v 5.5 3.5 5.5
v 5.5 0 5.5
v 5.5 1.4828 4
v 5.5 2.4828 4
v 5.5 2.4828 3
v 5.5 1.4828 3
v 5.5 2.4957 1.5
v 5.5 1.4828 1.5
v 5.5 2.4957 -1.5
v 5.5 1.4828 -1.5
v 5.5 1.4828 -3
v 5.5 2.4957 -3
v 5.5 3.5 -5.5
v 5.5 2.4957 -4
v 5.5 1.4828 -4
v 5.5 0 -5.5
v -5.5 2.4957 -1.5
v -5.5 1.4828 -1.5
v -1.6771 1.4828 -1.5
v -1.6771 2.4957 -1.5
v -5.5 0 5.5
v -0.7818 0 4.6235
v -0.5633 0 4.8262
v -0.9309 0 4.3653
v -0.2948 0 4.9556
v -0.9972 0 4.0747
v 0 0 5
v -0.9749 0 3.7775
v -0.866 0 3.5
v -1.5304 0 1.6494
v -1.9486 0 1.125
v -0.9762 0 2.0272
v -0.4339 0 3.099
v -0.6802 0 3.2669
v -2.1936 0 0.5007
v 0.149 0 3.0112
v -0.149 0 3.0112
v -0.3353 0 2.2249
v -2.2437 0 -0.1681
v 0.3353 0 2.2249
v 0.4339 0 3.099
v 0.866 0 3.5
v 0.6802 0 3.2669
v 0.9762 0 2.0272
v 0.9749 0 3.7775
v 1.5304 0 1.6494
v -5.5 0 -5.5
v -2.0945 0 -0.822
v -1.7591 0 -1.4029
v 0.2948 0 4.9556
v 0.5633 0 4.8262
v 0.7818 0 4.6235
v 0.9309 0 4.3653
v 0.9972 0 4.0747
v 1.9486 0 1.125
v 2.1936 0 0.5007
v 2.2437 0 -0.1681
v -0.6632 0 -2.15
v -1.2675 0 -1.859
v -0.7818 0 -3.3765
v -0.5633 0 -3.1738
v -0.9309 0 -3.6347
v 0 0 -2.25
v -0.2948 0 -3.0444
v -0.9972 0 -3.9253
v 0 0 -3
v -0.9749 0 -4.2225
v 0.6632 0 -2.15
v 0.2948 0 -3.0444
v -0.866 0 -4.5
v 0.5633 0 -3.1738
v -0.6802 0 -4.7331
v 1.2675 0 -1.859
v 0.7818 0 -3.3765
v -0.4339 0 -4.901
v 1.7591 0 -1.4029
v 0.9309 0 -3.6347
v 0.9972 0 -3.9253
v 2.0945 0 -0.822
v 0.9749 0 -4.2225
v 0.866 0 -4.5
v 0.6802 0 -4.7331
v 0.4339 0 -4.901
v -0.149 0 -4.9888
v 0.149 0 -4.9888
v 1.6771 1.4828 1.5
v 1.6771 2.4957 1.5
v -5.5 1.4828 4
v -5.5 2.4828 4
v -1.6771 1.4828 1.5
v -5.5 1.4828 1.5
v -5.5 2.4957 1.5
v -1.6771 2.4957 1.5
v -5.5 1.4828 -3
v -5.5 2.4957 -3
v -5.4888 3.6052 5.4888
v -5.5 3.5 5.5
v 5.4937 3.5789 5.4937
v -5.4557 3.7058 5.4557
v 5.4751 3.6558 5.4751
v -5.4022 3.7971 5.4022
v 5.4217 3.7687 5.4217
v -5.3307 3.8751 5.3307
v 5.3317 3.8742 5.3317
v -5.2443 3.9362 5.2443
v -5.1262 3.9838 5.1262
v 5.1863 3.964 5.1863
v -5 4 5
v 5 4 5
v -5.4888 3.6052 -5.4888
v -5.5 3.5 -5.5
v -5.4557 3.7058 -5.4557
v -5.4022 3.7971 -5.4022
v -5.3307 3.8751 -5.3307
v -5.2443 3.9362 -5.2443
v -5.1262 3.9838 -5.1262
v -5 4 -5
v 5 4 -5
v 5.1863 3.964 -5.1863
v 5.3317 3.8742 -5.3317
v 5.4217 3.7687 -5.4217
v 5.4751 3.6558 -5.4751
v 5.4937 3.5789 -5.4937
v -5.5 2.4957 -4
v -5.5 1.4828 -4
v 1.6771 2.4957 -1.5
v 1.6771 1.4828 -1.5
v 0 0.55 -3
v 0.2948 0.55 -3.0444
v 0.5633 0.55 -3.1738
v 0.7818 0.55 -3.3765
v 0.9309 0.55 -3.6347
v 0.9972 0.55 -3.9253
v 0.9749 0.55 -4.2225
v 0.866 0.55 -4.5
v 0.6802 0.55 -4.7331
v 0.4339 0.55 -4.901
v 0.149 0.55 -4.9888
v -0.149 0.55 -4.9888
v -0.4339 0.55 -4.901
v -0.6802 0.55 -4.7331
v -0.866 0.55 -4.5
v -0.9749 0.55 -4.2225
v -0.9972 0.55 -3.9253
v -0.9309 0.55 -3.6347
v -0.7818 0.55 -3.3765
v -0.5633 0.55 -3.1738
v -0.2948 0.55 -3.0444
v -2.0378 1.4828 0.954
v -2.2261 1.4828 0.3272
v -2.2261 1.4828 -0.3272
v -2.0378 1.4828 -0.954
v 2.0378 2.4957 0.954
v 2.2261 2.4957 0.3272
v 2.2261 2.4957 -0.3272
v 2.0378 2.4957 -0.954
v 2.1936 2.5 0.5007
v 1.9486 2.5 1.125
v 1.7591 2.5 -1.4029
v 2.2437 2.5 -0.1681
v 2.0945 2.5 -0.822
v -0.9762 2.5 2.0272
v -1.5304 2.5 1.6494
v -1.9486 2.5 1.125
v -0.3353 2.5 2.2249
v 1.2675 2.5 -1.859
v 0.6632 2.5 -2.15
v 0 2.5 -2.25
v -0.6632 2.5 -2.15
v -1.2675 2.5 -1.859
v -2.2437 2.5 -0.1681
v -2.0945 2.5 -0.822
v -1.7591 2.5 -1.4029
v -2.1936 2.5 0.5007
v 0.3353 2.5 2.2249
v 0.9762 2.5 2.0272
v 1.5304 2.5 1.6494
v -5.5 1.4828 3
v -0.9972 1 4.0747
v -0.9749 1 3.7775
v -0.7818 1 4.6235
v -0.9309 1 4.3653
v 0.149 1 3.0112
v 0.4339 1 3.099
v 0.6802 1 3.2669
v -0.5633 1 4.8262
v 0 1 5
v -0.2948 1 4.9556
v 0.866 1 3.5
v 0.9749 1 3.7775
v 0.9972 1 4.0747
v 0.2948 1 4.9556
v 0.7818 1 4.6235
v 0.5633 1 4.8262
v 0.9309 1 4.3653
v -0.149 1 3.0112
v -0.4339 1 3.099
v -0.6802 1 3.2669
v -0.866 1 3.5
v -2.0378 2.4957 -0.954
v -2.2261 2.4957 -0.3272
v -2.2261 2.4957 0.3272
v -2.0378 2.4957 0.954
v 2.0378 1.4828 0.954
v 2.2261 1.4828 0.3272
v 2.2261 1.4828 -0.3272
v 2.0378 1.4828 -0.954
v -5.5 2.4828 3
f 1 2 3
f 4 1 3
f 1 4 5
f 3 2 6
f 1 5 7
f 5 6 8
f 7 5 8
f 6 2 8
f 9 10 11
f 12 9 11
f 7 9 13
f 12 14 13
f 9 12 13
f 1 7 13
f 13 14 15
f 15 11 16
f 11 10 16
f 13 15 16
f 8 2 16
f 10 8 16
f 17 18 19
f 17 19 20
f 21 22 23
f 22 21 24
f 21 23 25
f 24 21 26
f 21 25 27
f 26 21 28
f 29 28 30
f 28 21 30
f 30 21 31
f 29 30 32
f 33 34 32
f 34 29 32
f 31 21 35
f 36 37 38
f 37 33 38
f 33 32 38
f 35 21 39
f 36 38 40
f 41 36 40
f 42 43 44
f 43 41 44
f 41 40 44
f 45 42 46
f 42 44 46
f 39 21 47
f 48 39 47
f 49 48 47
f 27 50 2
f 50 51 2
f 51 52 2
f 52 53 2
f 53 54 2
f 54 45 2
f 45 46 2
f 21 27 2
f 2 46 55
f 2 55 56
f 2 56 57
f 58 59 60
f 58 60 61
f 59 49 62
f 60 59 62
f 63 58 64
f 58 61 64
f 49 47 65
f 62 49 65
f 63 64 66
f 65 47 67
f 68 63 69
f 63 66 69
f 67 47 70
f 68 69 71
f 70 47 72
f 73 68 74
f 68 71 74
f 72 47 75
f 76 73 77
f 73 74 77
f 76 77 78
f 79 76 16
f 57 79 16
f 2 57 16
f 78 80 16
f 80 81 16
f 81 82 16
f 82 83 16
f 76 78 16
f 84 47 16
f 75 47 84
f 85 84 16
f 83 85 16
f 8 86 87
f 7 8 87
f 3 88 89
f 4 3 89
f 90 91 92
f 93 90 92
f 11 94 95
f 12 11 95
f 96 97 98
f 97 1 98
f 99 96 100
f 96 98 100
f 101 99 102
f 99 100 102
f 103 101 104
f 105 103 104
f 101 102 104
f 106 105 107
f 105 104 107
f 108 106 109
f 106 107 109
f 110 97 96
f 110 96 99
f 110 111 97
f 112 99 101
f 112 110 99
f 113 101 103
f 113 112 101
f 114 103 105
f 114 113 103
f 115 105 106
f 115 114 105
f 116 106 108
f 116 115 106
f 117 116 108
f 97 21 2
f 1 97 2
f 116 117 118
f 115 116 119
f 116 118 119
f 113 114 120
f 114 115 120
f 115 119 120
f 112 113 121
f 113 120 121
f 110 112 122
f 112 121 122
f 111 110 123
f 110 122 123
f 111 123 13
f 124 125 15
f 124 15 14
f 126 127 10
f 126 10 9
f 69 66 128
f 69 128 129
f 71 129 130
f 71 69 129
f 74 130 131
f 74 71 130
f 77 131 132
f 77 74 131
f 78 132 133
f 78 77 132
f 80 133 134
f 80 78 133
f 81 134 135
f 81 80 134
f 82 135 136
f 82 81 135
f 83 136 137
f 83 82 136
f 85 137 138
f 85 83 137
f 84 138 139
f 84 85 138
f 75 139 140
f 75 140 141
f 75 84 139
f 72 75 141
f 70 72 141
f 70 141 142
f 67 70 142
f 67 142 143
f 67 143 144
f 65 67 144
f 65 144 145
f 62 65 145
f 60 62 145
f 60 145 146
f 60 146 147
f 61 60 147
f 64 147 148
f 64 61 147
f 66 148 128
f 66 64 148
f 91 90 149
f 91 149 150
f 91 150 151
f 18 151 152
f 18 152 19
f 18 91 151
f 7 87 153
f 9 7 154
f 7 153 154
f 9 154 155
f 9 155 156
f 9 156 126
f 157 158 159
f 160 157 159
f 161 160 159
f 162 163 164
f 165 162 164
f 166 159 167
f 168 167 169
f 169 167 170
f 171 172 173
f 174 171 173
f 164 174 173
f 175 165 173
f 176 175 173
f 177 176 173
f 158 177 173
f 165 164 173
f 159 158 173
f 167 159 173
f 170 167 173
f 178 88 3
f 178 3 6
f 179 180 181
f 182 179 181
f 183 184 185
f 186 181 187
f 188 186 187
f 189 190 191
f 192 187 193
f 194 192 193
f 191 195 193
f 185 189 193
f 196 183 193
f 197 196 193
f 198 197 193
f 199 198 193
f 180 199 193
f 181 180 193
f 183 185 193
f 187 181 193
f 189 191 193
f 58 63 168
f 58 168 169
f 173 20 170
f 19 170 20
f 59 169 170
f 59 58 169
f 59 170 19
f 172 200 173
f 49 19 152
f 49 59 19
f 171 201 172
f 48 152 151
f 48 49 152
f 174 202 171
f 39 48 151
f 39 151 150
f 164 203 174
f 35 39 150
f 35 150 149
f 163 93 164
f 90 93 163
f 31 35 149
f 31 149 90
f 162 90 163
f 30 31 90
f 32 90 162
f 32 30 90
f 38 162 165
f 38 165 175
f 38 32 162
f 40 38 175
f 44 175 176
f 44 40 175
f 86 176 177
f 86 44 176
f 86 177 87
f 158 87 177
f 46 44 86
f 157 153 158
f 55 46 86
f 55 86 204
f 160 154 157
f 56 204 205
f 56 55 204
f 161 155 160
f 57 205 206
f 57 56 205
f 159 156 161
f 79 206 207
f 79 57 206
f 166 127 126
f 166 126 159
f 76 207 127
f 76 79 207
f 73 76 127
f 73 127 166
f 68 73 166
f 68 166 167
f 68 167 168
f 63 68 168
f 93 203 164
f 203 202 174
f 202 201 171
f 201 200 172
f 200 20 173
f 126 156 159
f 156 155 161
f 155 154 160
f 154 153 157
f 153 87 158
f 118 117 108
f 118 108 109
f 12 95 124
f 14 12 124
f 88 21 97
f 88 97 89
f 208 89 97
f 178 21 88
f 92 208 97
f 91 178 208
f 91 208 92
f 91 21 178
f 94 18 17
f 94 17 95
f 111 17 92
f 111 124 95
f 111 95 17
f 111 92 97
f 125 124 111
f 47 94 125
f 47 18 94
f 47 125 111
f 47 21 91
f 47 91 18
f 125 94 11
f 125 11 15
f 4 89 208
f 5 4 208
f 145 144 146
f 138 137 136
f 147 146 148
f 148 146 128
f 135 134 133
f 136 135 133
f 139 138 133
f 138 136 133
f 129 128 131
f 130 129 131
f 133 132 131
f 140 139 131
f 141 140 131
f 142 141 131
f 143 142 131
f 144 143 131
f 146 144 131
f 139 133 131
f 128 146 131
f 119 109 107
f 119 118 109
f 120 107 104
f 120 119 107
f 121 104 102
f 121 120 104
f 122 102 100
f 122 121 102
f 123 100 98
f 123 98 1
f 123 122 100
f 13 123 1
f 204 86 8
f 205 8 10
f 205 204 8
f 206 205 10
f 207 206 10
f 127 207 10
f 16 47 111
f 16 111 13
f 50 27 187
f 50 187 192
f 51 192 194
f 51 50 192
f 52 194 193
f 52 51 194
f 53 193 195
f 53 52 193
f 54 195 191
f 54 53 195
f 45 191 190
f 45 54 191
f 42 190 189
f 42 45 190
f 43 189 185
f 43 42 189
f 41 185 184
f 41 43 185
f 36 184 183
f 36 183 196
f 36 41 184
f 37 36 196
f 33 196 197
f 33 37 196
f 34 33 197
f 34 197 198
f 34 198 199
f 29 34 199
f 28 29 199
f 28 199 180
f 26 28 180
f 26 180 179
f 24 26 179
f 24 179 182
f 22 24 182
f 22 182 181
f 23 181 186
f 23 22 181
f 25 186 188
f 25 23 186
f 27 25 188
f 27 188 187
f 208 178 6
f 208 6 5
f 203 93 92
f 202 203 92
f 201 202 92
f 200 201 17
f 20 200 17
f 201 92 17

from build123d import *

# Parameters (mm, degrees)
SKETCH2_W               = 11
SKETCH2_H               = 11
BOSS_EXTRUDE1_DEPTH     = 4
CUT_EXTRUDE2_DEPTH      = 9.746427842
CUT_EXTRUDE2_DEPTH_BACK = 9.746427842
SKETCH4_W               = 1
SKETCH4_H               = 1
SKETCH4_W_2             = 3
SKETCH4_H_2             = 1.012866832
CUT_EXTRUDE3_DEPTH      = 2.5
CUT_EXTRUDE3_DEPTH_BACK = 9.746427842
SKETCH5_R               = 2.25
SKETCH8_R               = 1
CUT_EXTRUDE4_DEPTH      = 1
SKETCH8_3_R             = 1
CUT_EXTRUDE5_DEPTH      = 0.55
FILLET2_R               = 0.5


with BuildPart() as part:
    # Sketch2 → Boss-Extrude1 (new body)
    with BuildSketch(Plane(origin=(0, 0, 0), x_dir=(1, 0, 0), z_dir=(0, 1, 0))):
        Rectangle(SKETCH2_W, SKETCH2_H)
    extrude(amount=BOSS_EXTRUDE1_DEPTH)

    # Sketch4 → Cut-Extrude2 (cut, two sides: drawn at the far end of the back side and taken through both)
    with BuildSketch(Plane(origin=(0, 0, 0), x_dir=(0, 0, -1), z_dir=(1, 0, 0)).offset(-CUT_EXTRUDE2_DEPTH_BACK)):
        with Locations((-3.5, 1.982791405)):
            Rectangle(SKETCH4_W, SKETCH4_H)
        with Locations((0, 1.989224821)):
            Rectangle(SKETCH4_W_2, SKETCH4_H_2)
        with Locations((3.5, 1.989224821)):
            Rectangle(SKETCH4_W, SKETCH4_H_2)
    extrude(amount=CUT_EXTRUDE2_DEPTH + CUT_EXTRUDE2_DEPTH_BACK, mode=Mode.SUBTRACT)

    # Sketch5 → Cut-Extrude3 (cut, two sides: drawn at the far end of the back side and taken through both)
    with BuildSketch(Plane(origin=(0, 0, 0), x_dir=(1, 0, 0), z_dir=(0, 1, 0)).offset(-CUT_EXTRUDE3_DEPTH_BACK)):
        Circle(SKETCH5_R)
    extrude(amount=CUT_EXTRUDE3_DEPTH + CUT_EXTRUDE3_DEPTH_BACK, mode=Mode.SUBTRACT)

    # Sketch8 → Cut-Extrude4 (cut)
    with BuildSketch(Plane(origin=(0, 0, 0), x_dir=(1, 0, 0), z_dir=(0, 1, 0))):
        with Locations((0, -4)):
            Circle(SKETCH8_R)
    extrude(amount=CUT_EXTRUDE4_DEPTH, mode=Mode.SUBTRACT)

    # Sketch8<3> → Cut-Extrude5 (cut)
    with BuildSketch(Plane(origin=(0, 0, 0), x_dir=(1, 0, 0), z_dir=(0, 1, 0))):
        with Locations((0, 4)):
            Circle(SKETCH8_3_R)
    extrude(amount=CUT_EXTRUDE5_DEPTH, mode=Mode.SUBTRACT)

    # Fillet2
    fillet2_edges = [part.edges().sort_by_distance(p)[0] for p in [
        (0, 4, 5.5),
        (-5.5, 4, 0),
        (0, 4, -5.5),
        (5.5, 4, 0),
    ]]
    fillet(fillet2_edges, radius=FILLET2_R)


solid = part.part
